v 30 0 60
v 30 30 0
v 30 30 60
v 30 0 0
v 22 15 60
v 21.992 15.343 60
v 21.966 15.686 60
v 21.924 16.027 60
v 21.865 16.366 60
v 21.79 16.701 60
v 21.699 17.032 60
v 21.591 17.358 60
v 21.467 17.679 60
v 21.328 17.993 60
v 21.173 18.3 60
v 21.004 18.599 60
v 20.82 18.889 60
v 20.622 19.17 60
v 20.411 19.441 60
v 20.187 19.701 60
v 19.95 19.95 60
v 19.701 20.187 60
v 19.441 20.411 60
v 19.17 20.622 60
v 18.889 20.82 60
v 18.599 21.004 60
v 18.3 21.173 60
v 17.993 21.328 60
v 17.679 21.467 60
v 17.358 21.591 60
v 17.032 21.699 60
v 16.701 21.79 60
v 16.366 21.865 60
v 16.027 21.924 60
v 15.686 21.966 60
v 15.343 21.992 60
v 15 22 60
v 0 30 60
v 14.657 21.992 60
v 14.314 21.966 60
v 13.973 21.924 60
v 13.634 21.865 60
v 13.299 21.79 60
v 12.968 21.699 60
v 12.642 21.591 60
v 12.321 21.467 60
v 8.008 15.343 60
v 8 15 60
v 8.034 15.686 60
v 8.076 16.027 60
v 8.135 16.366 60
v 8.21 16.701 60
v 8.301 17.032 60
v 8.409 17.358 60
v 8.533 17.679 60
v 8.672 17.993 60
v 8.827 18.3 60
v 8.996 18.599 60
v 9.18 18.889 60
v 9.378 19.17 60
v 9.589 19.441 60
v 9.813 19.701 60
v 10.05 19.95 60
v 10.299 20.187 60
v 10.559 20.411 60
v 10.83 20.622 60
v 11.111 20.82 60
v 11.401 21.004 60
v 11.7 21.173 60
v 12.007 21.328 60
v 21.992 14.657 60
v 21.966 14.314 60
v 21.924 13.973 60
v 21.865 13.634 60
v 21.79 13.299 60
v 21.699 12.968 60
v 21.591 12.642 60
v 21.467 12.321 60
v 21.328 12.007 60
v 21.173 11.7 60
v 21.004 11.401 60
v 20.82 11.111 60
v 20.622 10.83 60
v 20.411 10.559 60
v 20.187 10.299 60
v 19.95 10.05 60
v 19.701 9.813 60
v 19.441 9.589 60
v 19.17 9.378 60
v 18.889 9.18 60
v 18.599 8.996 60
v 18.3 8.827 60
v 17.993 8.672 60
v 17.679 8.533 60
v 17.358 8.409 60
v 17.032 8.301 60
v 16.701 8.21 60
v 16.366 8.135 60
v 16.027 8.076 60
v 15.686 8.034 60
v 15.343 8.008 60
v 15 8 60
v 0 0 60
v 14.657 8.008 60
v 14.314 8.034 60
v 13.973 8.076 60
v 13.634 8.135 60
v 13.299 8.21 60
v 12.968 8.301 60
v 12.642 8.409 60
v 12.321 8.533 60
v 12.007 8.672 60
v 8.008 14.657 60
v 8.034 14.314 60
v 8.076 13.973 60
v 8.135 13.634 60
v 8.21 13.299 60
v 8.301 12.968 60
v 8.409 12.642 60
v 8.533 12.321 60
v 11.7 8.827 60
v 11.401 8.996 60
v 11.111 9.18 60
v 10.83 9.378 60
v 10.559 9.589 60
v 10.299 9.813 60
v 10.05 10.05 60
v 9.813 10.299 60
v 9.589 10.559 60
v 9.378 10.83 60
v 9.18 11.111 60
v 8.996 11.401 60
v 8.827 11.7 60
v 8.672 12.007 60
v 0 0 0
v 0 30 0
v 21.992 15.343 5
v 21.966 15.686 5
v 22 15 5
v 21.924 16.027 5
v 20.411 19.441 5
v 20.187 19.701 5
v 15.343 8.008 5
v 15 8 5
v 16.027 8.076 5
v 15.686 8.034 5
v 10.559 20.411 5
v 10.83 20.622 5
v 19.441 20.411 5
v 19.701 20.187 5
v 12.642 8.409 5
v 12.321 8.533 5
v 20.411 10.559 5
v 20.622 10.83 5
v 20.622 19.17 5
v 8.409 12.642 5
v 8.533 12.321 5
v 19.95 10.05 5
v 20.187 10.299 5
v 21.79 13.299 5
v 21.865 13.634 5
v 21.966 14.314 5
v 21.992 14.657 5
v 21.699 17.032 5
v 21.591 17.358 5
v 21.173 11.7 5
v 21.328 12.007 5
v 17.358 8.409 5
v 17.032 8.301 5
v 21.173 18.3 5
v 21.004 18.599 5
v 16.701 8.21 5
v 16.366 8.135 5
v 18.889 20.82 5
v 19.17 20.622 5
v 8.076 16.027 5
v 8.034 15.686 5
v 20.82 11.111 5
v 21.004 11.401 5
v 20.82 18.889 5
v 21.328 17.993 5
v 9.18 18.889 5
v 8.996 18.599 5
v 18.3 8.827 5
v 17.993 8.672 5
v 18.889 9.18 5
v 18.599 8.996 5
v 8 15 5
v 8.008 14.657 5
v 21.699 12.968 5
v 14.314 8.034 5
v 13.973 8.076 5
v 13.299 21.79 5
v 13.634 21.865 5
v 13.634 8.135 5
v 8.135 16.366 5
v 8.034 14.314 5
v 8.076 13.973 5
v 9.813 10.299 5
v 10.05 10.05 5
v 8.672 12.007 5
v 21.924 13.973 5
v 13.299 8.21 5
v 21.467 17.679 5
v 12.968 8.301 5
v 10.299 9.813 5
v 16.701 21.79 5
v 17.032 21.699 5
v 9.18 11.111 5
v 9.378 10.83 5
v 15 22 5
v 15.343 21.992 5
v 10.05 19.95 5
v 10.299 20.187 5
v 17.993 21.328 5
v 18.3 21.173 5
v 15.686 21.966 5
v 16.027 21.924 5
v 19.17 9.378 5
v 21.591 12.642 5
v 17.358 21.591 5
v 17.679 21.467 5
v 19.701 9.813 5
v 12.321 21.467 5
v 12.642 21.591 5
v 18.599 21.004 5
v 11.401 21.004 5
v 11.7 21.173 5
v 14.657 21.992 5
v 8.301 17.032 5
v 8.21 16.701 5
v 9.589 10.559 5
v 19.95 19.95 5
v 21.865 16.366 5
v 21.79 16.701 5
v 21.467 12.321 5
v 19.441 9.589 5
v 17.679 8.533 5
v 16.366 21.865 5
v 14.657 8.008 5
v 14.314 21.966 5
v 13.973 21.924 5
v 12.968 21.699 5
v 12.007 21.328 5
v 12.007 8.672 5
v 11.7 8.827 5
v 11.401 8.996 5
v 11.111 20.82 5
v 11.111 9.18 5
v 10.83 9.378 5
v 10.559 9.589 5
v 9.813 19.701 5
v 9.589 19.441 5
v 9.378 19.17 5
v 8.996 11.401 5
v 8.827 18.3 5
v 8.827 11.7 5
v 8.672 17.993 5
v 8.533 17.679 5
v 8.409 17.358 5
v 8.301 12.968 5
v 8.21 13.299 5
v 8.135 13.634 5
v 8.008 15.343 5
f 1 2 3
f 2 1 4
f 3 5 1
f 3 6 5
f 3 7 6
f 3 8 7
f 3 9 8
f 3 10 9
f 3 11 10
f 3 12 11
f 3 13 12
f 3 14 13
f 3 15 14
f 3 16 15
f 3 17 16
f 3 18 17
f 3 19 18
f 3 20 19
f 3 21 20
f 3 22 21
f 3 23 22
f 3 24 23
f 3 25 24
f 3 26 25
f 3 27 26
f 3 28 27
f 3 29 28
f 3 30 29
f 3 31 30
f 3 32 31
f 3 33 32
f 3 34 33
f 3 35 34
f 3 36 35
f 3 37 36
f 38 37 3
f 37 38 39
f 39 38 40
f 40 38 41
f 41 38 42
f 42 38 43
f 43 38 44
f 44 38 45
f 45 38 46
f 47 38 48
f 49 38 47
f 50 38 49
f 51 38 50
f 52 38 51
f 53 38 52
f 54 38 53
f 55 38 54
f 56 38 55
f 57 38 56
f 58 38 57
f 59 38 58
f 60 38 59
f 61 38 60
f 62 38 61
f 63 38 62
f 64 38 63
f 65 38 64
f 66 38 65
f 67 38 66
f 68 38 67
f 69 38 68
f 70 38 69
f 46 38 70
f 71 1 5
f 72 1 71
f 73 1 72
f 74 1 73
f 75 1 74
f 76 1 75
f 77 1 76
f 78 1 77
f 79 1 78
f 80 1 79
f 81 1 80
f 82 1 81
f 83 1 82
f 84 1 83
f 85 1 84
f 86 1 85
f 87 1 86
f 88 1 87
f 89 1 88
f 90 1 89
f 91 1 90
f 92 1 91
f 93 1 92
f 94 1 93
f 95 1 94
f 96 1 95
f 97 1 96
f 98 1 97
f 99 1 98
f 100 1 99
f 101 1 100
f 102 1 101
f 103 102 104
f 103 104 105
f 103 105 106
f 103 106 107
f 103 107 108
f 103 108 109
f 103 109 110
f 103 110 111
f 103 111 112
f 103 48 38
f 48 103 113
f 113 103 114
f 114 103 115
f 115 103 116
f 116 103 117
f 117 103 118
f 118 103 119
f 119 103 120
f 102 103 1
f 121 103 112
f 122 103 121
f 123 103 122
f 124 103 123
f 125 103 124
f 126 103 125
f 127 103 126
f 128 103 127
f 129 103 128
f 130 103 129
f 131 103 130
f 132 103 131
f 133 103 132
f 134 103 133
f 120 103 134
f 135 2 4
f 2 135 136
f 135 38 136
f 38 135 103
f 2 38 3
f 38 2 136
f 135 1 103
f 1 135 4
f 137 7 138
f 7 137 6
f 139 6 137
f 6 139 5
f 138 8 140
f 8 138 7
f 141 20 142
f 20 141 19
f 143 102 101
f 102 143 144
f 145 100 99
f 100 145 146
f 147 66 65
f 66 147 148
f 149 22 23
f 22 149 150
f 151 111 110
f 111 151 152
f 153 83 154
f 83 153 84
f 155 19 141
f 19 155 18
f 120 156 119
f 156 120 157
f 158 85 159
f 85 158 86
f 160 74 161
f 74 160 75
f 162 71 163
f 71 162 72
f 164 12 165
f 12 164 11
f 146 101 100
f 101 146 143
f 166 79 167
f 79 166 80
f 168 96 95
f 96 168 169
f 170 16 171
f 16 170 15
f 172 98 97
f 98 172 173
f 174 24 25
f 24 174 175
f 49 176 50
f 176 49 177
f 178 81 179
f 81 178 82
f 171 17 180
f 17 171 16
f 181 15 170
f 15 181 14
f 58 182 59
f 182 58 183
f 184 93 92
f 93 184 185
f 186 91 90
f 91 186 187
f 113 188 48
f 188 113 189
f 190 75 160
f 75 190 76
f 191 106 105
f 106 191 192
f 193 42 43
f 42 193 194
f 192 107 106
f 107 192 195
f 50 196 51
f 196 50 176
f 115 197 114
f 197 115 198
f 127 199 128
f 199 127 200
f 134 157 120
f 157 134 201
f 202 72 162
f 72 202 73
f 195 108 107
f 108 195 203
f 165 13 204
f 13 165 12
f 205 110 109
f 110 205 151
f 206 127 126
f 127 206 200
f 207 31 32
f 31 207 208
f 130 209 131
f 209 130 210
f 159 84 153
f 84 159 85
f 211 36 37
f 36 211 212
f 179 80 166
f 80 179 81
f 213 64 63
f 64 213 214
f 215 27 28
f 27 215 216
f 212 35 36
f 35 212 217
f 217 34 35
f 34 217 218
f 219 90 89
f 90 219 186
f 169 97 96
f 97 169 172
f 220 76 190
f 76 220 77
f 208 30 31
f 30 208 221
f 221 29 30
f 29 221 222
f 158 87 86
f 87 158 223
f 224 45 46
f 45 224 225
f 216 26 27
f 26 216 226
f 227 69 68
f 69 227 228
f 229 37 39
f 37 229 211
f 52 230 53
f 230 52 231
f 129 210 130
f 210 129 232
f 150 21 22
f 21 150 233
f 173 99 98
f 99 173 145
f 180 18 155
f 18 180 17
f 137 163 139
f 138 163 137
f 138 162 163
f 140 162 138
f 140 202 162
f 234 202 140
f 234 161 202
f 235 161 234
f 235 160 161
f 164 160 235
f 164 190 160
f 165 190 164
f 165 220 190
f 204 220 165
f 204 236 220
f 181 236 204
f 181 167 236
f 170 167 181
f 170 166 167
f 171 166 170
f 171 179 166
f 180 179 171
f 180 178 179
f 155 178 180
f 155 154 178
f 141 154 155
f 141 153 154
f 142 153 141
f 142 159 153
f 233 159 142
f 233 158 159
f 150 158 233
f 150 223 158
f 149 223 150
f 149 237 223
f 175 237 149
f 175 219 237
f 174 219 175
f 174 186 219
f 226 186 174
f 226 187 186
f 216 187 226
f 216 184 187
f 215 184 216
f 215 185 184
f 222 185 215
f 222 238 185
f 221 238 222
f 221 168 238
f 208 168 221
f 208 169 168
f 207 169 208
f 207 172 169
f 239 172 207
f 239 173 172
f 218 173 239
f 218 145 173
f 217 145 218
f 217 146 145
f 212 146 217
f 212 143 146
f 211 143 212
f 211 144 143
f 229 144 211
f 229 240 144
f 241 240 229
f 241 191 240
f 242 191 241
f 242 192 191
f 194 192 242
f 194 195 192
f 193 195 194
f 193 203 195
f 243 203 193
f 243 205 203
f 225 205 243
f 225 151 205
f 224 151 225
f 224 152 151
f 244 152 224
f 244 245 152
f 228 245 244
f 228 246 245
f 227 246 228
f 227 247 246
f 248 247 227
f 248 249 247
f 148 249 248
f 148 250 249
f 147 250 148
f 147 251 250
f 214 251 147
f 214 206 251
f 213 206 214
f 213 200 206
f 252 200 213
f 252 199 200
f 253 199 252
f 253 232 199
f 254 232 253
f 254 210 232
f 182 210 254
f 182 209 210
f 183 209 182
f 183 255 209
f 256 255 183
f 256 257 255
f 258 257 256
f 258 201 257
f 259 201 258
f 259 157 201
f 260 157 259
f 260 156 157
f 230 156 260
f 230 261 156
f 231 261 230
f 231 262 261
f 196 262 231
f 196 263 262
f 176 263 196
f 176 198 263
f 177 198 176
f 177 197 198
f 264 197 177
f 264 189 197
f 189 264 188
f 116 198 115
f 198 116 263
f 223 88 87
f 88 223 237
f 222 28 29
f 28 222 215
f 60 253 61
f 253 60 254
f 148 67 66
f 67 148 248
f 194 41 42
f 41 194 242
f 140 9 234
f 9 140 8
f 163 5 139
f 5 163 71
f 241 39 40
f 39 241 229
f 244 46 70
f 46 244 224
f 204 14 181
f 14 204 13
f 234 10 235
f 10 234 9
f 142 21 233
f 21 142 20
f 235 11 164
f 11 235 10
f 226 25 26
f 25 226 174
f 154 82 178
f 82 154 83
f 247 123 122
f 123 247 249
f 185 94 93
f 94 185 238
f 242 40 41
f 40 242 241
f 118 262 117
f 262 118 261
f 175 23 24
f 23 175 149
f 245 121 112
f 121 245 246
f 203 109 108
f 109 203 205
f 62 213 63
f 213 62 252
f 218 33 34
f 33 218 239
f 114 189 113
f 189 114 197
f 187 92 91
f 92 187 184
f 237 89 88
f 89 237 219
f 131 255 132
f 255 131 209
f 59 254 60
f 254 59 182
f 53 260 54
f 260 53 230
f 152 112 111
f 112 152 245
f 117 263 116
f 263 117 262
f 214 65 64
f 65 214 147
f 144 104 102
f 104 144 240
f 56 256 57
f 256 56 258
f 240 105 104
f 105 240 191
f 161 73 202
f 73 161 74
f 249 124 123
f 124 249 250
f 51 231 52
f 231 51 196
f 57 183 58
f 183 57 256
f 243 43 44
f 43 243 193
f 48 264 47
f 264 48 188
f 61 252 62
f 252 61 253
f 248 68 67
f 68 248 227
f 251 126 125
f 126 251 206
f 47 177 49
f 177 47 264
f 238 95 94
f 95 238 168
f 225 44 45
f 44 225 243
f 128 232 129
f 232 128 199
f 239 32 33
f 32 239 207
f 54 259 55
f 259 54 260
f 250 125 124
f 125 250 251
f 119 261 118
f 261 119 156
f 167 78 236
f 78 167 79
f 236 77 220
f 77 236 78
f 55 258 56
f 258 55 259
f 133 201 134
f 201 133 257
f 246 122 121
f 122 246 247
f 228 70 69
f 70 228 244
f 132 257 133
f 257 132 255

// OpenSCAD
$fn=128;
difference()
{
  cube([30,30,60]);
  translate([15,15,5]) cylinder(h=60,d=14);
}
